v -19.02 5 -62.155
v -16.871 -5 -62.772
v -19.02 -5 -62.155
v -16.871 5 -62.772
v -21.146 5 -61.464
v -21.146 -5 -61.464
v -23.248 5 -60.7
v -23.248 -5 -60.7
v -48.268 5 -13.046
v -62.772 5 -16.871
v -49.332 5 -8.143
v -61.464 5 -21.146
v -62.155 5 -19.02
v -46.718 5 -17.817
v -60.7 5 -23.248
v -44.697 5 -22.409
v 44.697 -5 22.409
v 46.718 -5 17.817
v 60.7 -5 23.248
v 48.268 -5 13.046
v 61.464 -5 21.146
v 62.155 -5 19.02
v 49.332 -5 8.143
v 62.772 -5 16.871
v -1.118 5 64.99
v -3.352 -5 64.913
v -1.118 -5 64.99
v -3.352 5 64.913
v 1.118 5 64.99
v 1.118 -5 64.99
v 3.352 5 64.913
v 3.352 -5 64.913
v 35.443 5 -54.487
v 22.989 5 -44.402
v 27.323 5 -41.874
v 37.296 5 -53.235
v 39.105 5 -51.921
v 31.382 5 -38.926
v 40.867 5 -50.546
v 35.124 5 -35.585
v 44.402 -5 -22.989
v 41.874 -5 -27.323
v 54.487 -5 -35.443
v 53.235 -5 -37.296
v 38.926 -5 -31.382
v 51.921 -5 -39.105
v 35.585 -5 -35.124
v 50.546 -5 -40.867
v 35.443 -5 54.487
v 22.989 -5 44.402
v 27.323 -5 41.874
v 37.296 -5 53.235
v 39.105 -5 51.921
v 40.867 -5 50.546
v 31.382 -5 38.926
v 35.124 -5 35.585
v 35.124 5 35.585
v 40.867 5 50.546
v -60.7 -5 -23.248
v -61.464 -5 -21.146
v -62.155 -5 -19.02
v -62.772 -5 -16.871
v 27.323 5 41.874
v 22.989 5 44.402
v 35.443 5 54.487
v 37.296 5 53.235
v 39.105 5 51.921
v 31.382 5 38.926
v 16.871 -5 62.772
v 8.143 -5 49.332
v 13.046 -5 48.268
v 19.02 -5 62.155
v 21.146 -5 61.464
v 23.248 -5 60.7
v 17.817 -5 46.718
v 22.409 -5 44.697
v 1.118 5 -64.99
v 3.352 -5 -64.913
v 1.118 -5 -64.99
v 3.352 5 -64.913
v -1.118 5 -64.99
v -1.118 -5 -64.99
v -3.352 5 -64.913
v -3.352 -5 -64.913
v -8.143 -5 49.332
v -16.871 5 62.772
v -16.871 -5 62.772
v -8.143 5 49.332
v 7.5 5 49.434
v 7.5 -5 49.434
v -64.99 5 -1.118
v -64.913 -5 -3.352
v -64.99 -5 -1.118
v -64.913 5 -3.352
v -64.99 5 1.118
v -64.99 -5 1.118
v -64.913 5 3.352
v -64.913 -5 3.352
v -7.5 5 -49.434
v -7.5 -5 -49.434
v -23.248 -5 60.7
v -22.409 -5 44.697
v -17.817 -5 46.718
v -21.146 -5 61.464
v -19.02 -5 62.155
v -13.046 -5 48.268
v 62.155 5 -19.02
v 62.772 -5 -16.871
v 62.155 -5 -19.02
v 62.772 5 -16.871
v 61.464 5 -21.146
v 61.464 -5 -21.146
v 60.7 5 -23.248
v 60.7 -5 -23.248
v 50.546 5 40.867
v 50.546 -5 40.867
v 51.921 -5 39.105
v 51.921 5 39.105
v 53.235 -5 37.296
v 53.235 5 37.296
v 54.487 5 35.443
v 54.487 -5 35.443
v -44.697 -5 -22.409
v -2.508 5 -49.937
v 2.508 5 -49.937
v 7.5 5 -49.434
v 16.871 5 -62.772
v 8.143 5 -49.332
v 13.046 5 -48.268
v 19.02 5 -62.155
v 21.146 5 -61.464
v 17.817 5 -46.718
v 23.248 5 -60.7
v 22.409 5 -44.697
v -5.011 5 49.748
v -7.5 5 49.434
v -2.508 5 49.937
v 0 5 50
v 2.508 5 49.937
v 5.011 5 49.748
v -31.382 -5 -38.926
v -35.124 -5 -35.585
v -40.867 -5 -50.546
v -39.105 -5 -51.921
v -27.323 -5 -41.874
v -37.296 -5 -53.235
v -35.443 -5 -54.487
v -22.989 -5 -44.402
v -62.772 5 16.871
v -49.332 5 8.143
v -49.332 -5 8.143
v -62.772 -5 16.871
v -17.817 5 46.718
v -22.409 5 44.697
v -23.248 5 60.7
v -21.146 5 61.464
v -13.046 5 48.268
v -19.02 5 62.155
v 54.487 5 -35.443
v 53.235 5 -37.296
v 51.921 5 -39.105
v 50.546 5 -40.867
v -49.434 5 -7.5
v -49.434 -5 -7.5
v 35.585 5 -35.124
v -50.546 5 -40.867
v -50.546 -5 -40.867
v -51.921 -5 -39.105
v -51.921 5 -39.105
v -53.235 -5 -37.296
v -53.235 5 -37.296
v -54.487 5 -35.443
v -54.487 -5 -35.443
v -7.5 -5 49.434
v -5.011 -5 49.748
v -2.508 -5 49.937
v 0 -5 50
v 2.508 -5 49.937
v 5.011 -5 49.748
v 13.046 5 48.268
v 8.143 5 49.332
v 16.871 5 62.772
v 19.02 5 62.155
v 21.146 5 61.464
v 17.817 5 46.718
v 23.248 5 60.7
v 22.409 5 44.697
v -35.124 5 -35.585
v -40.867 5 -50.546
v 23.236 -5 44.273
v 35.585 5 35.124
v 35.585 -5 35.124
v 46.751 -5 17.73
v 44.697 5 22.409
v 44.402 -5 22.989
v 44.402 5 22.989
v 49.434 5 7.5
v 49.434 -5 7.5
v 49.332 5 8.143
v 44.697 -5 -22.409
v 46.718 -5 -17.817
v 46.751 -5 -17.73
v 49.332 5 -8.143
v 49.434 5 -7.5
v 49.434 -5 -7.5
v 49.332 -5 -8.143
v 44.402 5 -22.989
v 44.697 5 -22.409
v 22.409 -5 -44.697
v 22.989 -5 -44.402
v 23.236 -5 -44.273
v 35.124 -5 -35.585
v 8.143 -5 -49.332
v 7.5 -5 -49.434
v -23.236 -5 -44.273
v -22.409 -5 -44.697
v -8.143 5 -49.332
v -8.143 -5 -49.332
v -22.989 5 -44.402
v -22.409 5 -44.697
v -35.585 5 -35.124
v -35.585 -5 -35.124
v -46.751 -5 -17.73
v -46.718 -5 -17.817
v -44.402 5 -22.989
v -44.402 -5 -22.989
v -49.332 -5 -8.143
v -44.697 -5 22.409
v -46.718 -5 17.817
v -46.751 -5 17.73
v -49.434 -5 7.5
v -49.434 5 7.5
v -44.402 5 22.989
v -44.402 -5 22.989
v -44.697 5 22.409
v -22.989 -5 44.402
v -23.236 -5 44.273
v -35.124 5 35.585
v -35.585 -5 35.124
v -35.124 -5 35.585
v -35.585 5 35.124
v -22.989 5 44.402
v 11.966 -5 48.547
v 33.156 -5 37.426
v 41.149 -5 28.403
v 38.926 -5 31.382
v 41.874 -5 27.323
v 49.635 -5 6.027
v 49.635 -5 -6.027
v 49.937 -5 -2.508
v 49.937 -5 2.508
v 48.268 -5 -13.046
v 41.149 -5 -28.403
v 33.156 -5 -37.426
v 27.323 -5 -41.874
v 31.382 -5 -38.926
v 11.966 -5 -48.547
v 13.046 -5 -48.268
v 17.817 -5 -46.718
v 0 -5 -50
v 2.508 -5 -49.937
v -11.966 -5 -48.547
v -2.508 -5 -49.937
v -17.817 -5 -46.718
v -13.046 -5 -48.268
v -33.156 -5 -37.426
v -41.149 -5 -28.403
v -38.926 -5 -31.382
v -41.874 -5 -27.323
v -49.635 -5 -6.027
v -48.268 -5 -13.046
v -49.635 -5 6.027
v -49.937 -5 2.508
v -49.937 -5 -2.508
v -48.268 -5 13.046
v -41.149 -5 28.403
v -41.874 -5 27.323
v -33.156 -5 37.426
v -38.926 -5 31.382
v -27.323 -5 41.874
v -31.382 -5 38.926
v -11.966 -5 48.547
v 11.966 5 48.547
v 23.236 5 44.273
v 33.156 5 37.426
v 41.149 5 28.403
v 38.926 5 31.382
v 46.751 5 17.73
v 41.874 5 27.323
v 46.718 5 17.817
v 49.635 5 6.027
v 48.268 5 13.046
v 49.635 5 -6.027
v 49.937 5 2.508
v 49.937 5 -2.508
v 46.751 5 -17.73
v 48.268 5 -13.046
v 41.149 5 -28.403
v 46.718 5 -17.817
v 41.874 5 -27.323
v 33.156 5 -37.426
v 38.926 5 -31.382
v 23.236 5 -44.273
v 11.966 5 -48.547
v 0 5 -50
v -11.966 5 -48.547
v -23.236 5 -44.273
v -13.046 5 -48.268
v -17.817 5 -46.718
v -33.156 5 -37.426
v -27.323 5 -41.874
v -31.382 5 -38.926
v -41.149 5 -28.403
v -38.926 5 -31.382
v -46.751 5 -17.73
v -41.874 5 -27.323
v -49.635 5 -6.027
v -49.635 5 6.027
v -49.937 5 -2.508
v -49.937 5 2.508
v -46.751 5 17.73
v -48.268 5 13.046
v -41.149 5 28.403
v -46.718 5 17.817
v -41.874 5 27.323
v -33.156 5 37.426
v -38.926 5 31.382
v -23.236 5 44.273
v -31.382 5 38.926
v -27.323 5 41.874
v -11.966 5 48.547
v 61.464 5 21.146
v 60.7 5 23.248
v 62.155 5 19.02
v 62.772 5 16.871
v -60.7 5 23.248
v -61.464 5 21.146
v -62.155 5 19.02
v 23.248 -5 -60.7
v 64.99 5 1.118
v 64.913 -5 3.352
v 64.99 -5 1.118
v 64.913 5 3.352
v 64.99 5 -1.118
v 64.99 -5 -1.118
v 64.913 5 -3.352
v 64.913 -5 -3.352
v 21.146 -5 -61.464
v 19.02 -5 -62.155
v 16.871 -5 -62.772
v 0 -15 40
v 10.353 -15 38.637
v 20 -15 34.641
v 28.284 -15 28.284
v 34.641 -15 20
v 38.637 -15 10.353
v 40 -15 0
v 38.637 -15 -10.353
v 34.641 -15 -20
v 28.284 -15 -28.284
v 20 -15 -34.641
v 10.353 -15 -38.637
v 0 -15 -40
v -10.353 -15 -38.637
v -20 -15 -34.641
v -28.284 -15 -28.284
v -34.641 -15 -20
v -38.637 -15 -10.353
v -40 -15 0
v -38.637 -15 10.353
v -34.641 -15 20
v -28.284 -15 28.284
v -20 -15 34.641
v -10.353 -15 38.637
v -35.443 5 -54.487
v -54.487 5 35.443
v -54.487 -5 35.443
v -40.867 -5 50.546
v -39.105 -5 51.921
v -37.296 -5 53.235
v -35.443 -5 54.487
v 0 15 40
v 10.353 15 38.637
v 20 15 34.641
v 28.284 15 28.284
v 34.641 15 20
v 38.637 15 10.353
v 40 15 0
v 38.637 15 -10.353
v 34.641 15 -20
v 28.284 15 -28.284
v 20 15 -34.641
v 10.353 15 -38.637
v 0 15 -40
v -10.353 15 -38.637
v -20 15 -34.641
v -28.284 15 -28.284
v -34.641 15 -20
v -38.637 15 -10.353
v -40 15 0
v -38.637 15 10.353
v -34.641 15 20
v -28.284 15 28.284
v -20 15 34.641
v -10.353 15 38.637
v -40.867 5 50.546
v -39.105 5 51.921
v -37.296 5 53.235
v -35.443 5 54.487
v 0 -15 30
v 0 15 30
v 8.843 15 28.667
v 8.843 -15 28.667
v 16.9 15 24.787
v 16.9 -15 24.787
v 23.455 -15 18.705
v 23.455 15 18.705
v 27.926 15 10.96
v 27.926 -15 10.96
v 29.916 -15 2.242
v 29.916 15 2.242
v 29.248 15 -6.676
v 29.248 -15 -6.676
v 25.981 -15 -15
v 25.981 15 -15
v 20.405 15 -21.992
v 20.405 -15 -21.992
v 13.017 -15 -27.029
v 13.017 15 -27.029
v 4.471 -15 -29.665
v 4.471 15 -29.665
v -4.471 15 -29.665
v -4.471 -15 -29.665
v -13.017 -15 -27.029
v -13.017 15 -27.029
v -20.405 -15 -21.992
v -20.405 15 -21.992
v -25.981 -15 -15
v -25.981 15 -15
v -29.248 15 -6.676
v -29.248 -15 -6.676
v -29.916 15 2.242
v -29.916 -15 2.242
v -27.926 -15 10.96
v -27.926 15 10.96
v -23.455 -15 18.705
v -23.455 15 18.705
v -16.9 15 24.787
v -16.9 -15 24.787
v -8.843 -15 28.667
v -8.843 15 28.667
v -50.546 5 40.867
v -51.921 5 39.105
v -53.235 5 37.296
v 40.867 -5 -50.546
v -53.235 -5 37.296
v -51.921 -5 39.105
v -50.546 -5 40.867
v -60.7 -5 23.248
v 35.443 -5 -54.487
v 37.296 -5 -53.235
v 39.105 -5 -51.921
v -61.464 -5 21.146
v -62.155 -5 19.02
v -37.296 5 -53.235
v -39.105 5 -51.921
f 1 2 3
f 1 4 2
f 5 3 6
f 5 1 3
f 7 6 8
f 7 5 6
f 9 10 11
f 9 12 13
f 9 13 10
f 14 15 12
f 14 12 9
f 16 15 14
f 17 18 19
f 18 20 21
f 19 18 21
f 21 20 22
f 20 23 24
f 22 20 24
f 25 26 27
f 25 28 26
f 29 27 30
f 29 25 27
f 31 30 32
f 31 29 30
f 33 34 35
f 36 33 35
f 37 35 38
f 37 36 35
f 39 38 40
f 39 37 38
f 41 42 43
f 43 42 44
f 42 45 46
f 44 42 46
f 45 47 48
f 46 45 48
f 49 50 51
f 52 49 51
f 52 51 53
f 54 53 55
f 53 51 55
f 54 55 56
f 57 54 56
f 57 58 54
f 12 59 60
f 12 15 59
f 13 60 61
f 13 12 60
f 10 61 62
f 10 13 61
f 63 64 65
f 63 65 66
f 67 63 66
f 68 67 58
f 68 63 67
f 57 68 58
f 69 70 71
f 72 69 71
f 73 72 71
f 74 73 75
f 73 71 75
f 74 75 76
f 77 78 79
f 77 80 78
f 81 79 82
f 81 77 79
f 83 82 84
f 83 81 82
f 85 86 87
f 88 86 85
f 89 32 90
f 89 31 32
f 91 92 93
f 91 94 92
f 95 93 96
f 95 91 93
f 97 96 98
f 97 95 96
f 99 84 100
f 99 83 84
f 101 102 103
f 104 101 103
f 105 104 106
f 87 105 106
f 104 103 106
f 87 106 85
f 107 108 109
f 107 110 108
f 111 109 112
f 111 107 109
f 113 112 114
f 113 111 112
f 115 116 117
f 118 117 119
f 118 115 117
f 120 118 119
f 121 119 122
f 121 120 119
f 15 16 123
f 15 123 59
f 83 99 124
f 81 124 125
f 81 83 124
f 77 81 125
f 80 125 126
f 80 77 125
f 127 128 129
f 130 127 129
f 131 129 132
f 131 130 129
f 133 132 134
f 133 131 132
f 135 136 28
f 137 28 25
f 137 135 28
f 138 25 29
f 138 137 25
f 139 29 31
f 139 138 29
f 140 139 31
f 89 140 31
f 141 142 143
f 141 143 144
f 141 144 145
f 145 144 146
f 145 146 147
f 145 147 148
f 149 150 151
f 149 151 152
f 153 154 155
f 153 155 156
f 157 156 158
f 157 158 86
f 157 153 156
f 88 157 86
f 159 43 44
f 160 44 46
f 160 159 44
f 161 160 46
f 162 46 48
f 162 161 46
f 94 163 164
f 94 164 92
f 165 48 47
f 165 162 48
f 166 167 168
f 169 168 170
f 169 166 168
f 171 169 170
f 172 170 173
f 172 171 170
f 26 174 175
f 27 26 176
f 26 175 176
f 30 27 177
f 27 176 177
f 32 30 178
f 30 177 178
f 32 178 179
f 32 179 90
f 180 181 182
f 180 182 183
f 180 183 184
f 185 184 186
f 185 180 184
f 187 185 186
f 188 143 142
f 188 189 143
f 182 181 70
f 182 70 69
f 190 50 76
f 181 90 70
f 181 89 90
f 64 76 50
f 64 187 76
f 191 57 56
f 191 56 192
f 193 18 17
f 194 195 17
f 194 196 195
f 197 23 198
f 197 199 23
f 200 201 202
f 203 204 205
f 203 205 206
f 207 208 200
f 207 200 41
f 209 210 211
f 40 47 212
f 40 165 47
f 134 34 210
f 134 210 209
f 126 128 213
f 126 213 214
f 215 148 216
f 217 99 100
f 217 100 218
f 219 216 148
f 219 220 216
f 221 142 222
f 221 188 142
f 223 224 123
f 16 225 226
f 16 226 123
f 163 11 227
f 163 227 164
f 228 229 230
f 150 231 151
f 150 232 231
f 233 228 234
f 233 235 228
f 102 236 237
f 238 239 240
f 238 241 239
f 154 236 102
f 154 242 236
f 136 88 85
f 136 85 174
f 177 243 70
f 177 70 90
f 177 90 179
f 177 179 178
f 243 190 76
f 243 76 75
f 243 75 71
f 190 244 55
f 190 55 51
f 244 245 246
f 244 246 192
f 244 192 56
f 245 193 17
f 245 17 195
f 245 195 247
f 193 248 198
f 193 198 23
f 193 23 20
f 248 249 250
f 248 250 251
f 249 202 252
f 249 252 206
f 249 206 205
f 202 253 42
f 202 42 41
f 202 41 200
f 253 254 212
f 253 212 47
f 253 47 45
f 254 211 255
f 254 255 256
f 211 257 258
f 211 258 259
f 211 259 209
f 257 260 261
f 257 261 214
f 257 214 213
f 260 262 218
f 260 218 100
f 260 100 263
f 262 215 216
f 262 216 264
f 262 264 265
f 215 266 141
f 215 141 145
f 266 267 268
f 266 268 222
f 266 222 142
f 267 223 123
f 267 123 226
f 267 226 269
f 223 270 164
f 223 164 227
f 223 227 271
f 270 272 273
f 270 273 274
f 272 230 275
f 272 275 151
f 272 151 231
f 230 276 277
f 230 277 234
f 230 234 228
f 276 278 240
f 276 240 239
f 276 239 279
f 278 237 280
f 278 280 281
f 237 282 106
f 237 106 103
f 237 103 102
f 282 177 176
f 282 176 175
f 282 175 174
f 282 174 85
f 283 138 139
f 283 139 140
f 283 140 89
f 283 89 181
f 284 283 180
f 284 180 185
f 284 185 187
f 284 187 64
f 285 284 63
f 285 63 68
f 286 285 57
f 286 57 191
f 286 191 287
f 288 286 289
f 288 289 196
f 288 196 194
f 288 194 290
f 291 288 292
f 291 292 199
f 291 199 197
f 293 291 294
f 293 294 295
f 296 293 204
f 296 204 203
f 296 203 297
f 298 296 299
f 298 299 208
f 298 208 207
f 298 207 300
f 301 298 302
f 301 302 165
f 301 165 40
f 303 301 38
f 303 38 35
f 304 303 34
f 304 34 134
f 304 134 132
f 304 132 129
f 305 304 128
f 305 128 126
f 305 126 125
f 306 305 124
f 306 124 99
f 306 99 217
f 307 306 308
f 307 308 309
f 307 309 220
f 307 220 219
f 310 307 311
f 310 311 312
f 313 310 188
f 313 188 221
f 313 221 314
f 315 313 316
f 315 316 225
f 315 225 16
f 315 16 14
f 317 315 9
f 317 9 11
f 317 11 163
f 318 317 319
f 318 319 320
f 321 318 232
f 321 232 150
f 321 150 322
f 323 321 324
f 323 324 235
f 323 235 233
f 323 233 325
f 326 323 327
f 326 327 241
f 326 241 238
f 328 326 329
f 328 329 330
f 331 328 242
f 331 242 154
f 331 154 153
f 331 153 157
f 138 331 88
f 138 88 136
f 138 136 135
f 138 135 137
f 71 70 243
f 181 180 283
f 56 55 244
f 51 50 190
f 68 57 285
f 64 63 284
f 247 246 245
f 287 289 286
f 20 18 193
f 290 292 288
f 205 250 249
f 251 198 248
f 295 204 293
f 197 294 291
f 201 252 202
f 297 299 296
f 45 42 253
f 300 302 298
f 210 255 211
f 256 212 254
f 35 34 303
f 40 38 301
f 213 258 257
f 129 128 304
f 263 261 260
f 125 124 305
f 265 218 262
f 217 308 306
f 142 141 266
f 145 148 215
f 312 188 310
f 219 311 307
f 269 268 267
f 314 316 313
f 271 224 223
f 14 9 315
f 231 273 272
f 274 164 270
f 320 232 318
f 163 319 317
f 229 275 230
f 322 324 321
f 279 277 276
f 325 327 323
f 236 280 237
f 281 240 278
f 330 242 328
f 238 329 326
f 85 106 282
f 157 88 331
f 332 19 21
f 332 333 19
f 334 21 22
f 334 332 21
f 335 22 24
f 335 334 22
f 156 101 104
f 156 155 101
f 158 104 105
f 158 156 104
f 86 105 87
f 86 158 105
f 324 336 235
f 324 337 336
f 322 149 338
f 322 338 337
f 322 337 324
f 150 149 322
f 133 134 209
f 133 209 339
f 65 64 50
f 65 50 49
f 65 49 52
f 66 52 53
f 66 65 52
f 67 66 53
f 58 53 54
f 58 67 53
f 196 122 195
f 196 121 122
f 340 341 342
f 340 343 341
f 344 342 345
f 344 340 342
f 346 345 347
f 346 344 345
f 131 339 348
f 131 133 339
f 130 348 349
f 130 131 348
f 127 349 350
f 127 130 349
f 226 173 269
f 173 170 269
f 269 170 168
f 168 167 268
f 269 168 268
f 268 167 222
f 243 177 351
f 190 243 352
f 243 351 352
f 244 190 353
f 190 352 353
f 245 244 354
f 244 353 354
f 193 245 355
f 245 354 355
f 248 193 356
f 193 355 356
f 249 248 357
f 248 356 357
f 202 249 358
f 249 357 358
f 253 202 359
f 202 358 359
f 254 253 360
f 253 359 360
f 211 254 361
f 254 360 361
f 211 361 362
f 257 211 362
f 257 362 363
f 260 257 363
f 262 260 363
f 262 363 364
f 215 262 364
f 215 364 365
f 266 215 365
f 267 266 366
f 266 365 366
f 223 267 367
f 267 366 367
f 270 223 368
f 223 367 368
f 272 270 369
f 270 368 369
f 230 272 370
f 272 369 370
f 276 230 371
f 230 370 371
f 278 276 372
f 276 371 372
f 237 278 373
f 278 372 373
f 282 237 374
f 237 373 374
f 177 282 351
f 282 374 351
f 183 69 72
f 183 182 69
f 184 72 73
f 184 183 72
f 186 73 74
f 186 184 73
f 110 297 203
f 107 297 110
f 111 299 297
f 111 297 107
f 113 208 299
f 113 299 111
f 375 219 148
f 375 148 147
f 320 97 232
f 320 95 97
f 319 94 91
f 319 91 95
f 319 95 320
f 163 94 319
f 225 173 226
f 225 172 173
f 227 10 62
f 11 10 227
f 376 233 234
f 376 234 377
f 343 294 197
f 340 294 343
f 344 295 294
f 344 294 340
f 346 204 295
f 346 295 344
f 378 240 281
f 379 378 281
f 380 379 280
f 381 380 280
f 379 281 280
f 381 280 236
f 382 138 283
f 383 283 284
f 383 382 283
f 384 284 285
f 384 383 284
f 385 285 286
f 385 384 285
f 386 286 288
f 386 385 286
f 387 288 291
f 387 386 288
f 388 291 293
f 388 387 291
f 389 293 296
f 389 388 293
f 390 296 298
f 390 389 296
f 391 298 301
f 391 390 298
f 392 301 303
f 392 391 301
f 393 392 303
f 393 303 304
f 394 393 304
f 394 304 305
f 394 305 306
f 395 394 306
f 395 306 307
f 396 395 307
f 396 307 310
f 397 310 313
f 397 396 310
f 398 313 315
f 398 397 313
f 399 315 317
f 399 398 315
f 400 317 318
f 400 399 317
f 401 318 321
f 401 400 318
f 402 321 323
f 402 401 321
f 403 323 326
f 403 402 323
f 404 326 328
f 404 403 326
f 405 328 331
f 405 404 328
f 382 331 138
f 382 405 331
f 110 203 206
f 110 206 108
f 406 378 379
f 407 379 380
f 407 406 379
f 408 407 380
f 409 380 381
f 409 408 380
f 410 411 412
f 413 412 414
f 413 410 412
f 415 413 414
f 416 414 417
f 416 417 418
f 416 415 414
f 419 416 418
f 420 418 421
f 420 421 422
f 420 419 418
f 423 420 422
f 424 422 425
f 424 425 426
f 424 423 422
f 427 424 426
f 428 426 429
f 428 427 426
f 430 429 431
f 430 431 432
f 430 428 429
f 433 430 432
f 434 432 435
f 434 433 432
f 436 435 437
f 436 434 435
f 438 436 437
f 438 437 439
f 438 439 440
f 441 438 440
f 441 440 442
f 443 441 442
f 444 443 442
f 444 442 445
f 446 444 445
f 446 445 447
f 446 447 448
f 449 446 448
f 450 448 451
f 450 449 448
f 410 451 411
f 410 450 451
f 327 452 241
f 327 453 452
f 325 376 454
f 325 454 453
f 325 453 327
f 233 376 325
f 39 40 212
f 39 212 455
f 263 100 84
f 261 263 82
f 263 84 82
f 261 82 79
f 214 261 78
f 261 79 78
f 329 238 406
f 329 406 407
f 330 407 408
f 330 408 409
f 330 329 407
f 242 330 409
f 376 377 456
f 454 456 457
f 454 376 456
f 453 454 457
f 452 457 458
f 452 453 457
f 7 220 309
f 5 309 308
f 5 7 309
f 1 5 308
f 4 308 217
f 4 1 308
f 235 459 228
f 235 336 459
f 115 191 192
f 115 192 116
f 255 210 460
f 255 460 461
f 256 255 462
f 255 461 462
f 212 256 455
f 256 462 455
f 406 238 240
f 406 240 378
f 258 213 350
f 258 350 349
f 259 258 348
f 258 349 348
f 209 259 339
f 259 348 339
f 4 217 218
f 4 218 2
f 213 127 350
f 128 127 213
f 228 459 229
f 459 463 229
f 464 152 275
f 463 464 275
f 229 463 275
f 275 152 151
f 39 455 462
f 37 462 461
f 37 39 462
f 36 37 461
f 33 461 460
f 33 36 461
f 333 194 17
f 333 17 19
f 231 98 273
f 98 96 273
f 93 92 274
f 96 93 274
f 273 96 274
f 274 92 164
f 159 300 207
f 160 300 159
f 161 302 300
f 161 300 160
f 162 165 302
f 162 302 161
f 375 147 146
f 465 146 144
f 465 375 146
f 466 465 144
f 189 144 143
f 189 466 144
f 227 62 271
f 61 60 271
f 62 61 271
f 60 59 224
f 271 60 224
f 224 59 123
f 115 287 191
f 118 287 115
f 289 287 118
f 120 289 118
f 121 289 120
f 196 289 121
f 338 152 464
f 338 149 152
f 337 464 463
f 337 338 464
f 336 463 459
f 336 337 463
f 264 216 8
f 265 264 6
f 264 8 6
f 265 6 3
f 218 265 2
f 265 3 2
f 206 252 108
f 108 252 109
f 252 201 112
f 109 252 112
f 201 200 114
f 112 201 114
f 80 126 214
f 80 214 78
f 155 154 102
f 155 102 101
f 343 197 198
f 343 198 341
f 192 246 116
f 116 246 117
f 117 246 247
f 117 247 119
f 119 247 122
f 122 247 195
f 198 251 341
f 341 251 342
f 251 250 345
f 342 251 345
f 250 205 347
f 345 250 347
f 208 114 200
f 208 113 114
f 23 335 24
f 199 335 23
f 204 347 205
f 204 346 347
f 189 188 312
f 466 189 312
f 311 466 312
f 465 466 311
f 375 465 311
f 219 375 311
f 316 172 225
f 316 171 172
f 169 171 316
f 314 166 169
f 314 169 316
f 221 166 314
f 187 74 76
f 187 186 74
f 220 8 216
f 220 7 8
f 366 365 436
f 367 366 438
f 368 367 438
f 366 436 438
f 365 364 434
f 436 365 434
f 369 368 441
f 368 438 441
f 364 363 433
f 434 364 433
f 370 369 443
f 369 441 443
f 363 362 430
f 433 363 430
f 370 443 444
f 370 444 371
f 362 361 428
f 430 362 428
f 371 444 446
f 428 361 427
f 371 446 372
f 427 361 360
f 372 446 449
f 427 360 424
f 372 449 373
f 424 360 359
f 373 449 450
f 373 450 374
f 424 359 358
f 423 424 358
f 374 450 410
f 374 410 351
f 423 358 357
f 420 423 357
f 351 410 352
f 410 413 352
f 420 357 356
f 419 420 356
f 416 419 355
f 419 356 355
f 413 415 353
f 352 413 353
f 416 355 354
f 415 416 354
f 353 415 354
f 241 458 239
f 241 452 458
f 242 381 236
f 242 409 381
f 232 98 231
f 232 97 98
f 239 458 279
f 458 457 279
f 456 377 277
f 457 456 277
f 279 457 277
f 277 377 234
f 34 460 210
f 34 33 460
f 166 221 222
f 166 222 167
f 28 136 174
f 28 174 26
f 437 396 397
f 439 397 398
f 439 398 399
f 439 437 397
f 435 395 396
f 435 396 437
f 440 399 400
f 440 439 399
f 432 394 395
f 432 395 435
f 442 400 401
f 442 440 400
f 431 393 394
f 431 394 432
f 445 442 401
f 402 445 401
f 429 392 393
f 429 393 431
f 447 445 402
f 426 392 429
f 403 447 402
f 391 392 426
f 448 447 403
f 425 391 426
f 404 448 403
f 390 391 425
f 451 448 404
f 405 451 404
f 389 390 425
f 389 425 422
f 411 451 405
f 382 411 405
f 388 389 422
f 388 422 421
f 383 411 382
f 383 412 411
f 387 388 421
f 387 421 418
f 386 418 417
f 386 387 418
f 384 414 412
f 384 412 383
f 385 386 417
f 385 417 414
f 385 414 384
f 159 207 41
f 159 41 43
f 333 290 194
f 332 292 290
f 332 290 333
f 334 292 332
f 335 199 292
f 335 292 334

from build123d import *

# Parameters (mm, degrees)
EXTRUDE_1_DEPTH    = 5
EXTRUDE_1_2_DEPTH  = 5
EXTRUDE_1_3_DEPTH  = 5
EXTRUDE_1_4_DEPTH  = 5
EXTRUDE_1_5_DEPTH  = 5
EXTRUDE_1_6_DEPTH  = 5
EXTRUDE_1_7_DEPTH  = 5
EXTRUDE_1_8_DEPTH  = 5
EXTRUDE_1_9_DEPTH  = 5
EXTRUDE_1_10_DEPTH = 5
EXTRUDE_1_11_DEPTH = 5
EXTRUDE_1_12_DEPTH = 5
EXTRUDE_1_13_DEPTH = 5
EXTRUDE_1_14_DEPTH = 5
EXTRUDE_1_15_DEPTH = 5
EXTRUDE_1_16_DEPTH = 5
EXTRUDE_1_17_DEPTH = 5
EXTRUDE_1_18_DEPTH = 5
EXTRUDE_1_19_DEPTH = 5
EXTRUDE_1_20_DEPTH = 5
SKETCH_2_R         = 50
SKETCH_2_R_2       = 30
EXTRUDE_2_DEPTH    = 15
CHAMFER_1_SIZE     = 10


with BuildPart() as part:
    # 草图1 → 凸台-拉伸1 (new, symmetric)
    with BuildSketch(Plane(origin=(0, 0, 0), x_dir=(1, 0, 0), z_dir=(0, 1, 0))):
        with BuildLine():
            Line((-3.352362501, 64.91349371), (-7.5, 49.434299833))
            ThreePointArc((-7.5, 49.434299833), (0, 50), (7.5, 49.434299833))
            Line((7.5, 49.434299833), (3.352362501, 64.91349371))
            ThreePointArc((3.352362501, 64.91349371), (0, 65), (-3.352362501, 64.91349371))
        make_face()
    extrude(amount=EXTRUDE_1_DEPTH, both=True)



with BuildPart() as body_2:
    # 草图1 → Extrude 1 2 (new, symmetric)
    with BuildSketch(Plane(origin=(0, 0, 0), x_dir=(1, 0, 0), z_dir=(0, 1, 0))):
        with BuildLine():
            Line((16.871086519, 62.772338173), (8.143114881, 49.332440443))
            ThreePointArc((8.143114881, 49.332440443), (15.450849719, 47.552825815), (22.408962626, 44.697185527))
            Line((22.408962626, 44.697185527), (23.247658922, 60.700464204))
            ThreePointArc((23.247658922, 60.700464204), (20.086104634, 61.818673559), (16.871086519, 62.772338173))
        make_face()
    extrude(amount=EXTRUDE_1_2_DEPTH, both=True)


with BuildPart() as body_3:
    # 草图1 → Extrude 1 3 (new, symmetric)
    with BuildSketch(Plane(origin=(0, 0, 0), x_dir=(1, 0, 0), z_dir=(0, 1, 0))):
        with BuildLine():
            Line((35.443076043, 54.486588814), (22.989124942, 44.401578062))
            ThreePointArc((22.989124942, 44.401578062), (29.389262615, 40.450849719), (35.124379857, 35.584799278))
            Line((35.124379857, 35.584799278), (40.867312512, 50.545650337))
            ThreePointArc((40.867312512, 50.545650337), (38.206041399, 52.586104634), (35.443076043, 54.486588814))
        make_face()
    extrude(amount=EXTRUDE_1_3_DEPTH, both=True)


with BuildPart() as body_4:
    # 草图1 → Extrude 1 4 (new, symmetric)
    with BuildSketch(Plane(origin=(0, 0, 0), x_dir=(1, 0, 0), z_dir=(0, 1, 0))):
        with BuildLine():
            Line((50.545650337, 40.867312512), (35.584799278, 35.124379857))
            ThreePointArc((35.584799278, 35.124379857), (40.450849719, 29.389262615), (44.401578062, 22.989124942))
            Line((44.401578062, 22.989124942), (54.486588814, 35.443076043))
            ThreePointArc((54.486588814, 35.443076043), (52.586104634, 38.206041399), (50.545650337, 40.867312512))
        make_face()
    extrude(amount=EXTRUDE_1_4_DEPTH, both=True)


with BuildPart() as body_5:
    # 草图1 → Extrude 1 5 (new, symmetric)
    with BuildSketch(Plane(origin=(0, 0, 0), x_dir=(1, 0, 0), z_dir=(0, 1, 0))):
        with BuildLine():
            Line((60.700464204, 23.247658922), (44.697185527, 22.408962626))
            ThreePointArc((44.697185527, 22.408962626), (47.552825815, 15.450849719), (49.332440443, 8.143114881))
            Line((49.332440443, 8.143114881), (62.772338173, 16.871086519))
            ThreePointArc((62.772338173, 16.871086519), (61.818673559, 20.086104634), (60.700464204, 23.247658922))
        make_face()
    extrude(amount=EXTRUDE_1_5_DEPTH, both=True)


with BuildPart() as body_6:
    # 草图1 → Extrude 1 6 (new, symmetric)
    with BuildSketch(Plane(origin=(0, 0, 0), x_dir=(1, 0, 0), z_dir=(0, 1, 0))):
        with BuildLine():
            Line((64.91349371, 3.352362501), (49.434299833, 7.5))
            ThreePointArc((49.434299833, 7.5), (50, 0), (49.434299833, -7.5))
            Line((49.434299833, -7.5), (64.91349371, -3.352362501))
            ThreePointArc((64.91349371, -3.352362501), (65, 0), (64.91349371, 3.352362501))
        make_face()
    extrude(amount=EXTRUDE_1_6_DEPTH, both=True)


with BuildPart() as body_7:
    # 草图1 → Extrude 1 7 (new, symmetric)
    with BuildSketch(Plane(origin=(0, 0, 0), x_dir=(1, 0, 0), z_dir=(0, 1, 0))):
        with BuildLine():
            Line((62.772338173, -16.871086519), (49.332440443, -8.143114881))
            ThreePointArc((49.332440443, -8.143114881), (47.552825815, -15.450849719), (44.697185527, -22.408962626))
            Line((44.697185527, -22.408962626), (60.700464204, -23.247658922))
            ThreePointArc((60.700464204, -23.247658922), (61.818673559, -20.086104634), (62.772338173, -16.871086519))
        make_face()
    extrude(amount=EXTRUDE_1_7_DEPTH, both=True)


with BuildPart() as body_8:
    # 草图1 → Extrude 1 8 (new, symmetric)
    with BuildSketch(Plane(origin=(0, 0, 0), x_dir=(1, 0, 0), z_dir=(0, 1, 0))):
        with BuildLine():
            Line((54.486588814, -35.443076043), (44.401578062, -22.989124942))
            ThreePointArc((44.401578062, -22.989124942), (40.450849719, -29.389262615), (35.584799278, -35.124379857))
            Line((35.584799278, -35.124379857), (50.545650337, -40.867312512))
            ThreePointArc((50.545650337, -40.867312512), (52.586104634, -38.206041399), (54.486588814, -35.443076043))
        make_face()
    extrude(amount=EXTRUDE_1_8_DEPTH, both=True)


with BuildPart() as body_9:
    # 草图1 → Extrude 1 9 (new, symmetric)
    with BuildSketch(Plane(origin=(0, 0, 0), x_dir=(1, 0, 0), z_dir=(0, 1, 0))):
        with BuildLine():
            Line((40.867312512, -50.545650337), (35.124379857, -35.584799278))
            ThreePointArc((35.124379857, -35.584799278), (29.389262615, -40.450849719), (22.989124942, -44.401578062))
            Line((22.989124942, -44.401578062), (35.443076043, -54.486588814))
            ThreePointArc((35.443076043, -54.486588814), (38.206041399, -52.586104634), (40.867312512, -50.545650337))
        make_face()
    extrude(amount=EXTRUDE_1_9_DEPTH, both=True)


with BuildPart() as body_10:
    # 草图1 → Extrude 1 10 (new, symmetric)
    with BuildSketch(Plane(origin=(0, 0, 0), x_dir=(1, 0, 0), z_dir=(0, 1, 0))):
        with BuildLine():
            Line((23.247658922, -60.700464204), (22.408962626, -44.697185527))
            ThreePointArc((22.408962626, -44.697185527), (15.450849719, -47.552825815), (8.143114881, -49.332440443))
            Line((8.143114881, -49.332440443), (16.871086519, -62.772338173))
            ThreePointArc((16.871086519, -62.772338173), (20.086104634, -61.818673559), (23.247658922, -60.700464204))
        make_face()
    extrude(amount=EXTRUDE_1_10_DEPTH, both=True)


with BuildPart() as body_11:
    # 草图1 → Extrude 1 11 (new, symmetric)
    with BuildSketch(Plane(origin=(0, 0, 0), x_dir=(1, 0, 0), z_dir=(0, 1, 0))):
        with BuildLine():
            Line((3.352362501, -64.91349371), (7.5, -49.434299833))
            ThreePointArc((7.5, -49.434299833), (0, -50), (-7.5, -49.434299833))
            Line((-7.5, -49.434299833), (-3.352362501, -64.91349371))
            ThreePointArc((-3.352362501, -64.91349371), (0, -65), (3.352362501, -64.91349371))
        make_face()
    extrude(amount=EXTRUDE_1_11_DEPTH, both=True)


with BuildPart() as body_12:
    # 草图1 → Extrude 1 12 (new, symmetric)
    with BuildSketch(Plane(origin=(0, 0, 0), x_dir=(1, 0, 0), z_dir=(0, 1, 0))):
        with BuildLine():
            Line((-16.871086519, -62.772338173), (-8.143114881, -49.332440443))
            ThreePointArc((-8.143114881, -49.332440443), (-15.450849719, -47.552825815), (-22.408962626, -44.697185527))
            Line((-22.408962626, -44.697185527), (-23.247658922, -60.700464204))
            ThreePointArc((-23.247658922, -60.700464204), (-20.086104634, -61.818673559), (-16.871086519, -62.772338173))
        make_face()
    extrude(amount=EXTRUDE_1_12_DEPTH, both=True)


with BuildPart() as body_13:
    # 草图1 → Extrude 1 13 (new, symmetric)
    with BuildSketch(Plane(origin=(0, 0, 0), x_dir=(1, 0, 0), z_dir=(0, 1, 0))):
        with BuildLine():
            Line((-35.443076043, -54.486588814), (-22.989124942, -44.401578062))
            ThreePointArc((-22.989124942, -44.401578062), (-29.389262615, -40.450849719), (-35.124379857, -35.584799278))
            Line((-35.124379857, -35.584799278), (-40.867312512, -50.545650337))
            ThreePointArc((-40.867312512, -50.545650337), (-38.206041399, -52.586104634), (-35.443076043, -54.486588814))
        make_face()
    extrude(amount=EXTRUDE_1_13_DEPTH, both=True)


with BuildPart() as body_14:
    # 草图1 → Extrude 1 14 (new, symmetric)
    with BuildSketch(Plane(origin=(0, 0, 0), x_dir=(1, 0, 0), z_dir=(0, 1, 0))):
        with BuildLine():
            Line((-50.545650337, -40.867312512), (-35.584799278, -35.124379857))
            ThreePointArc((-35.584799278, -35.124379857), (-40.450849719, -29.389262615), (-44.401578062, -22.989124942))
            Line((-44.401578062, -22.989124942), (-54.486588814, -35.443076043))
            ThreePointArc((-54.486588814, -35.443076043), (-52.586104634, -38.206041399), (-50.545650337, -40.867312512))
        make_face()
    extrude(amount=EXTRUDE_1_14_DEPTH, both=True)


with BuildPart() as body_15:
    # 草图1 → Extrude 1 15 (new, symmetric)
    with BuildSketch(Plane(origin=(0, 0, 0), x_dir=(1, 0, 0), z_dir=(0, 1, 0))):
        with BuildLine():
            Line((-60.700464204, -23.247658922), (-44.697185527, -22.408962626))
            ThreePointArc((-44.697185527, -22.408962626), (-47.552825815, -15.450849719), (-49.332440443, -8.143114881))
            Line((-49.332440443, -8.143114881), (-62.772338173, -16.871086519))
            ThreePointArc((-62.772338173, -16.871086519), (-61.818673559, -20.086104634), (-60.700464204, -23.247658922))
        make_face()
    extrude(amount=EXTRUDE_1_15_DEPTH, both=True)


with BuildPart() as body_16:
    # 草图1 → Extrude 1 16 (new, symmetric)
    with BuildSketch(Plane(origin=(0, 0, 0), x_dir=(1, 0, 0), z_dir=(0, 1, 0))):
        with BuildLine():
            Line((-64.91349371, -3.352362501), (-49.434299833, -7.5))
            ThreePointArc((-49.434299833, -7.5), (-50, 0), (-49.434299833, 7.5))
            Line((-49.434299833, 7.5), (-64.91349371, 3.352362501))
            ThreePointArc((-64.91349371, 3.352362501), (-65, 0), (-64.91349371, -3.352362501))
        make_face()
    extrude(amount=EXTRUDE_1_16_DEPTH, both=True)


with BuildPart() as body_17:
    # 草图1 → Extrude 1 17 (new, symmetric)
    with BuildSketch(Plane(origin=(0, 0, 0), x_dir=(1, 0, 0), z_dir=(0, 1, 0))):
        with BuildLine():
            Line((-62.772338173, 16.871086519), (-49.332440443, 8.143114881))
            ThreePointArc((-49.332440443, 8.143114881), (-47.552825815, 15.450849719), (-44.697185527, 22.408962626))
            Line((-44.697185527, 22.408962626), (-60.700464204, 23.247658922))
            ThreePointArc((-60.700464204, 23.247658922), (-61.818673559, 20.086104634), (-62.772338173, 16.871086519))
        make_face()
    extrude(amount=EXTRUDE_1_17_DEPTH, both=True)


with BuildPart() as body_18:
    # 草图1 → Extrude 1 18 (new, symmetric)
    with BuildSketch(Plane(origin=(0, 0, 0), x_dir=(1, 0, 0), z_dir=(0, 1, 0))):
        with BuildLine():
            Line((-54.486588814, 35.443076043), (-44.401578062, 22.989124942))
            ThreePointArc((-44.401578062, 22.989124942), (-40.450849719, 29.389262615), (-35.584799278, 35.124379857))
            Line((-35.584799278, 35.124379857), (-50.545650337, 40.867312512))
            ThreePointArc((-50.545650337, 40.867312512), (-52.586104634, 38.206041399), (-54.486588814, 35.443076043))
        make_face()
    extrude(amount=EXTRUDE_1_18_DEPTH, both=True)


with BuildPart() as body_19:
    # 草图1 → Extrude 1 19 (new, symmetric)
    with BuildSketch(Plane(origin=(0, 0, 0), x_dir=(1, 0, 0), z_dir=(0, 1, 0))):
        with BuildLine():
            Line((-40.867312512, 50.545650337), (-35.124379857, 35.584799278))
            ThreePointArc((-35.124379857, 35.584799278), (-29.389262615, 40.450849719), (-22.989124942, 44.401578062))
            Line((-22.989124942, 44.401578062), (-35.443076043, 54.486588814))
            ThreePointArc((-35.443076043, 54.486588814), (-38.206041399, 52.586104634), (-40.867312512, 50.545650337))
        make_face()
    extrude(amount=EXTRUDE_1_19_DEPTH, both=True)


with BuildPart() as body_20:
    # 草图1 → Extrude 1 20 (new, symmetric)
    with BuildSketch(Plane(origin=(0, 0, 0), x_dir=(1, 0, 0), z_dir=(0, 1, 0))):
        with BuildLine():
            Line((-23.247658922, 60.700464204), (-22.408962626, 44.697185527))
            ThreePointArc((-22.408962626, 44.697185527), (-15.450849719, 47.552825815), (-8.143114881, 49.332440443))
            Line((-8.143114881, 49.332440443), (-16.871086519, 62.772338173))
            ThreePointArc((-16.871086519, 62.772338173), (-20.086104634, 61.818673559), (-23.247658922, 60.700464204))
        make_face()
    extrude(amount=EXTRUDE_1_20_DEPTH, both=True)


with BuildPart() as part_1:
    add(part.part)

    add(body_2.part)  # 凸台-拉伸2 merges body 2

    add(body_3.part)  # 凸台-拉伸2 merges body 3

    add(body_4.part)  # 凸台-拉伸2 merges body 4

    add(body_5.part)  # 凸台-拉伸2 merges body 5

    add(body_6.part)  # 凸台-拉伸2 merges body 6

    add(body_7.part)  # 凸台-拉伸2 merges body 7

    add(body_8.part)  # 凸台-拉伸2 merges body 8

    add(body_9.part)  # 凸台-拉伸2 merges body 9

    add(body_10.part)  # 凸台-拉伸2 merges body 10

    add(body_11.part)  # 凸台-拉伸2 merges body 11

    add(body_12.part)  # 凸台-拉伸2 merges body 12

    add(body_13.part)  # 凸台-拉伸2 merges body 13

    add(body_14.part)  # 凸台-拉伸2 merges body 14

    add(body_15.part)  # 凸台-拉伸2 merges body 15

    add(body_16.part)  # 凸台-拉伸2 merges body 16

    add(body_17.part)  # 凸台-拉伸2 merges body 17

    add(body_18.part)  # 凸台-拉伸2 merges body 18

    add(body_19.part)  # 凸台-拉伸2 merges body 19

    add(body_20.part)  # 凸台-拉伸2 merges body 20
    # 草图2 → 凸台-拉伸2 (add, symmetric)
    with BuildSketch(Plane(origin=(0, 0, 0), x_dir=(1, 0, 0), z_dir=(0, 1, 0))):
        with Locations(Location((0, 0, 0), (0, 0, 270))):
            Circle(SKETCH_2_R)
        with Locations(Location((0, 0, 0), (0, 0, 270))):
            Circle(SKETCH_2_R_2, mode=Mode.SUBTRACT)
    extrude(amount=EXTRUDE_2_DEPTH, both=True)

    # 倒角1
    chamfer_1_edges = [part_1.edges().sort_by_distance(p)[0] for p in [
        (0, 15, -50),
        (0, -15, -50),
    ]]
    chamfer(chamfer_1_edges, length=CHAMFER_1_SIZE - 0.0001)  # a hair under: the kernel refuses the full size


solid = part_1.part
